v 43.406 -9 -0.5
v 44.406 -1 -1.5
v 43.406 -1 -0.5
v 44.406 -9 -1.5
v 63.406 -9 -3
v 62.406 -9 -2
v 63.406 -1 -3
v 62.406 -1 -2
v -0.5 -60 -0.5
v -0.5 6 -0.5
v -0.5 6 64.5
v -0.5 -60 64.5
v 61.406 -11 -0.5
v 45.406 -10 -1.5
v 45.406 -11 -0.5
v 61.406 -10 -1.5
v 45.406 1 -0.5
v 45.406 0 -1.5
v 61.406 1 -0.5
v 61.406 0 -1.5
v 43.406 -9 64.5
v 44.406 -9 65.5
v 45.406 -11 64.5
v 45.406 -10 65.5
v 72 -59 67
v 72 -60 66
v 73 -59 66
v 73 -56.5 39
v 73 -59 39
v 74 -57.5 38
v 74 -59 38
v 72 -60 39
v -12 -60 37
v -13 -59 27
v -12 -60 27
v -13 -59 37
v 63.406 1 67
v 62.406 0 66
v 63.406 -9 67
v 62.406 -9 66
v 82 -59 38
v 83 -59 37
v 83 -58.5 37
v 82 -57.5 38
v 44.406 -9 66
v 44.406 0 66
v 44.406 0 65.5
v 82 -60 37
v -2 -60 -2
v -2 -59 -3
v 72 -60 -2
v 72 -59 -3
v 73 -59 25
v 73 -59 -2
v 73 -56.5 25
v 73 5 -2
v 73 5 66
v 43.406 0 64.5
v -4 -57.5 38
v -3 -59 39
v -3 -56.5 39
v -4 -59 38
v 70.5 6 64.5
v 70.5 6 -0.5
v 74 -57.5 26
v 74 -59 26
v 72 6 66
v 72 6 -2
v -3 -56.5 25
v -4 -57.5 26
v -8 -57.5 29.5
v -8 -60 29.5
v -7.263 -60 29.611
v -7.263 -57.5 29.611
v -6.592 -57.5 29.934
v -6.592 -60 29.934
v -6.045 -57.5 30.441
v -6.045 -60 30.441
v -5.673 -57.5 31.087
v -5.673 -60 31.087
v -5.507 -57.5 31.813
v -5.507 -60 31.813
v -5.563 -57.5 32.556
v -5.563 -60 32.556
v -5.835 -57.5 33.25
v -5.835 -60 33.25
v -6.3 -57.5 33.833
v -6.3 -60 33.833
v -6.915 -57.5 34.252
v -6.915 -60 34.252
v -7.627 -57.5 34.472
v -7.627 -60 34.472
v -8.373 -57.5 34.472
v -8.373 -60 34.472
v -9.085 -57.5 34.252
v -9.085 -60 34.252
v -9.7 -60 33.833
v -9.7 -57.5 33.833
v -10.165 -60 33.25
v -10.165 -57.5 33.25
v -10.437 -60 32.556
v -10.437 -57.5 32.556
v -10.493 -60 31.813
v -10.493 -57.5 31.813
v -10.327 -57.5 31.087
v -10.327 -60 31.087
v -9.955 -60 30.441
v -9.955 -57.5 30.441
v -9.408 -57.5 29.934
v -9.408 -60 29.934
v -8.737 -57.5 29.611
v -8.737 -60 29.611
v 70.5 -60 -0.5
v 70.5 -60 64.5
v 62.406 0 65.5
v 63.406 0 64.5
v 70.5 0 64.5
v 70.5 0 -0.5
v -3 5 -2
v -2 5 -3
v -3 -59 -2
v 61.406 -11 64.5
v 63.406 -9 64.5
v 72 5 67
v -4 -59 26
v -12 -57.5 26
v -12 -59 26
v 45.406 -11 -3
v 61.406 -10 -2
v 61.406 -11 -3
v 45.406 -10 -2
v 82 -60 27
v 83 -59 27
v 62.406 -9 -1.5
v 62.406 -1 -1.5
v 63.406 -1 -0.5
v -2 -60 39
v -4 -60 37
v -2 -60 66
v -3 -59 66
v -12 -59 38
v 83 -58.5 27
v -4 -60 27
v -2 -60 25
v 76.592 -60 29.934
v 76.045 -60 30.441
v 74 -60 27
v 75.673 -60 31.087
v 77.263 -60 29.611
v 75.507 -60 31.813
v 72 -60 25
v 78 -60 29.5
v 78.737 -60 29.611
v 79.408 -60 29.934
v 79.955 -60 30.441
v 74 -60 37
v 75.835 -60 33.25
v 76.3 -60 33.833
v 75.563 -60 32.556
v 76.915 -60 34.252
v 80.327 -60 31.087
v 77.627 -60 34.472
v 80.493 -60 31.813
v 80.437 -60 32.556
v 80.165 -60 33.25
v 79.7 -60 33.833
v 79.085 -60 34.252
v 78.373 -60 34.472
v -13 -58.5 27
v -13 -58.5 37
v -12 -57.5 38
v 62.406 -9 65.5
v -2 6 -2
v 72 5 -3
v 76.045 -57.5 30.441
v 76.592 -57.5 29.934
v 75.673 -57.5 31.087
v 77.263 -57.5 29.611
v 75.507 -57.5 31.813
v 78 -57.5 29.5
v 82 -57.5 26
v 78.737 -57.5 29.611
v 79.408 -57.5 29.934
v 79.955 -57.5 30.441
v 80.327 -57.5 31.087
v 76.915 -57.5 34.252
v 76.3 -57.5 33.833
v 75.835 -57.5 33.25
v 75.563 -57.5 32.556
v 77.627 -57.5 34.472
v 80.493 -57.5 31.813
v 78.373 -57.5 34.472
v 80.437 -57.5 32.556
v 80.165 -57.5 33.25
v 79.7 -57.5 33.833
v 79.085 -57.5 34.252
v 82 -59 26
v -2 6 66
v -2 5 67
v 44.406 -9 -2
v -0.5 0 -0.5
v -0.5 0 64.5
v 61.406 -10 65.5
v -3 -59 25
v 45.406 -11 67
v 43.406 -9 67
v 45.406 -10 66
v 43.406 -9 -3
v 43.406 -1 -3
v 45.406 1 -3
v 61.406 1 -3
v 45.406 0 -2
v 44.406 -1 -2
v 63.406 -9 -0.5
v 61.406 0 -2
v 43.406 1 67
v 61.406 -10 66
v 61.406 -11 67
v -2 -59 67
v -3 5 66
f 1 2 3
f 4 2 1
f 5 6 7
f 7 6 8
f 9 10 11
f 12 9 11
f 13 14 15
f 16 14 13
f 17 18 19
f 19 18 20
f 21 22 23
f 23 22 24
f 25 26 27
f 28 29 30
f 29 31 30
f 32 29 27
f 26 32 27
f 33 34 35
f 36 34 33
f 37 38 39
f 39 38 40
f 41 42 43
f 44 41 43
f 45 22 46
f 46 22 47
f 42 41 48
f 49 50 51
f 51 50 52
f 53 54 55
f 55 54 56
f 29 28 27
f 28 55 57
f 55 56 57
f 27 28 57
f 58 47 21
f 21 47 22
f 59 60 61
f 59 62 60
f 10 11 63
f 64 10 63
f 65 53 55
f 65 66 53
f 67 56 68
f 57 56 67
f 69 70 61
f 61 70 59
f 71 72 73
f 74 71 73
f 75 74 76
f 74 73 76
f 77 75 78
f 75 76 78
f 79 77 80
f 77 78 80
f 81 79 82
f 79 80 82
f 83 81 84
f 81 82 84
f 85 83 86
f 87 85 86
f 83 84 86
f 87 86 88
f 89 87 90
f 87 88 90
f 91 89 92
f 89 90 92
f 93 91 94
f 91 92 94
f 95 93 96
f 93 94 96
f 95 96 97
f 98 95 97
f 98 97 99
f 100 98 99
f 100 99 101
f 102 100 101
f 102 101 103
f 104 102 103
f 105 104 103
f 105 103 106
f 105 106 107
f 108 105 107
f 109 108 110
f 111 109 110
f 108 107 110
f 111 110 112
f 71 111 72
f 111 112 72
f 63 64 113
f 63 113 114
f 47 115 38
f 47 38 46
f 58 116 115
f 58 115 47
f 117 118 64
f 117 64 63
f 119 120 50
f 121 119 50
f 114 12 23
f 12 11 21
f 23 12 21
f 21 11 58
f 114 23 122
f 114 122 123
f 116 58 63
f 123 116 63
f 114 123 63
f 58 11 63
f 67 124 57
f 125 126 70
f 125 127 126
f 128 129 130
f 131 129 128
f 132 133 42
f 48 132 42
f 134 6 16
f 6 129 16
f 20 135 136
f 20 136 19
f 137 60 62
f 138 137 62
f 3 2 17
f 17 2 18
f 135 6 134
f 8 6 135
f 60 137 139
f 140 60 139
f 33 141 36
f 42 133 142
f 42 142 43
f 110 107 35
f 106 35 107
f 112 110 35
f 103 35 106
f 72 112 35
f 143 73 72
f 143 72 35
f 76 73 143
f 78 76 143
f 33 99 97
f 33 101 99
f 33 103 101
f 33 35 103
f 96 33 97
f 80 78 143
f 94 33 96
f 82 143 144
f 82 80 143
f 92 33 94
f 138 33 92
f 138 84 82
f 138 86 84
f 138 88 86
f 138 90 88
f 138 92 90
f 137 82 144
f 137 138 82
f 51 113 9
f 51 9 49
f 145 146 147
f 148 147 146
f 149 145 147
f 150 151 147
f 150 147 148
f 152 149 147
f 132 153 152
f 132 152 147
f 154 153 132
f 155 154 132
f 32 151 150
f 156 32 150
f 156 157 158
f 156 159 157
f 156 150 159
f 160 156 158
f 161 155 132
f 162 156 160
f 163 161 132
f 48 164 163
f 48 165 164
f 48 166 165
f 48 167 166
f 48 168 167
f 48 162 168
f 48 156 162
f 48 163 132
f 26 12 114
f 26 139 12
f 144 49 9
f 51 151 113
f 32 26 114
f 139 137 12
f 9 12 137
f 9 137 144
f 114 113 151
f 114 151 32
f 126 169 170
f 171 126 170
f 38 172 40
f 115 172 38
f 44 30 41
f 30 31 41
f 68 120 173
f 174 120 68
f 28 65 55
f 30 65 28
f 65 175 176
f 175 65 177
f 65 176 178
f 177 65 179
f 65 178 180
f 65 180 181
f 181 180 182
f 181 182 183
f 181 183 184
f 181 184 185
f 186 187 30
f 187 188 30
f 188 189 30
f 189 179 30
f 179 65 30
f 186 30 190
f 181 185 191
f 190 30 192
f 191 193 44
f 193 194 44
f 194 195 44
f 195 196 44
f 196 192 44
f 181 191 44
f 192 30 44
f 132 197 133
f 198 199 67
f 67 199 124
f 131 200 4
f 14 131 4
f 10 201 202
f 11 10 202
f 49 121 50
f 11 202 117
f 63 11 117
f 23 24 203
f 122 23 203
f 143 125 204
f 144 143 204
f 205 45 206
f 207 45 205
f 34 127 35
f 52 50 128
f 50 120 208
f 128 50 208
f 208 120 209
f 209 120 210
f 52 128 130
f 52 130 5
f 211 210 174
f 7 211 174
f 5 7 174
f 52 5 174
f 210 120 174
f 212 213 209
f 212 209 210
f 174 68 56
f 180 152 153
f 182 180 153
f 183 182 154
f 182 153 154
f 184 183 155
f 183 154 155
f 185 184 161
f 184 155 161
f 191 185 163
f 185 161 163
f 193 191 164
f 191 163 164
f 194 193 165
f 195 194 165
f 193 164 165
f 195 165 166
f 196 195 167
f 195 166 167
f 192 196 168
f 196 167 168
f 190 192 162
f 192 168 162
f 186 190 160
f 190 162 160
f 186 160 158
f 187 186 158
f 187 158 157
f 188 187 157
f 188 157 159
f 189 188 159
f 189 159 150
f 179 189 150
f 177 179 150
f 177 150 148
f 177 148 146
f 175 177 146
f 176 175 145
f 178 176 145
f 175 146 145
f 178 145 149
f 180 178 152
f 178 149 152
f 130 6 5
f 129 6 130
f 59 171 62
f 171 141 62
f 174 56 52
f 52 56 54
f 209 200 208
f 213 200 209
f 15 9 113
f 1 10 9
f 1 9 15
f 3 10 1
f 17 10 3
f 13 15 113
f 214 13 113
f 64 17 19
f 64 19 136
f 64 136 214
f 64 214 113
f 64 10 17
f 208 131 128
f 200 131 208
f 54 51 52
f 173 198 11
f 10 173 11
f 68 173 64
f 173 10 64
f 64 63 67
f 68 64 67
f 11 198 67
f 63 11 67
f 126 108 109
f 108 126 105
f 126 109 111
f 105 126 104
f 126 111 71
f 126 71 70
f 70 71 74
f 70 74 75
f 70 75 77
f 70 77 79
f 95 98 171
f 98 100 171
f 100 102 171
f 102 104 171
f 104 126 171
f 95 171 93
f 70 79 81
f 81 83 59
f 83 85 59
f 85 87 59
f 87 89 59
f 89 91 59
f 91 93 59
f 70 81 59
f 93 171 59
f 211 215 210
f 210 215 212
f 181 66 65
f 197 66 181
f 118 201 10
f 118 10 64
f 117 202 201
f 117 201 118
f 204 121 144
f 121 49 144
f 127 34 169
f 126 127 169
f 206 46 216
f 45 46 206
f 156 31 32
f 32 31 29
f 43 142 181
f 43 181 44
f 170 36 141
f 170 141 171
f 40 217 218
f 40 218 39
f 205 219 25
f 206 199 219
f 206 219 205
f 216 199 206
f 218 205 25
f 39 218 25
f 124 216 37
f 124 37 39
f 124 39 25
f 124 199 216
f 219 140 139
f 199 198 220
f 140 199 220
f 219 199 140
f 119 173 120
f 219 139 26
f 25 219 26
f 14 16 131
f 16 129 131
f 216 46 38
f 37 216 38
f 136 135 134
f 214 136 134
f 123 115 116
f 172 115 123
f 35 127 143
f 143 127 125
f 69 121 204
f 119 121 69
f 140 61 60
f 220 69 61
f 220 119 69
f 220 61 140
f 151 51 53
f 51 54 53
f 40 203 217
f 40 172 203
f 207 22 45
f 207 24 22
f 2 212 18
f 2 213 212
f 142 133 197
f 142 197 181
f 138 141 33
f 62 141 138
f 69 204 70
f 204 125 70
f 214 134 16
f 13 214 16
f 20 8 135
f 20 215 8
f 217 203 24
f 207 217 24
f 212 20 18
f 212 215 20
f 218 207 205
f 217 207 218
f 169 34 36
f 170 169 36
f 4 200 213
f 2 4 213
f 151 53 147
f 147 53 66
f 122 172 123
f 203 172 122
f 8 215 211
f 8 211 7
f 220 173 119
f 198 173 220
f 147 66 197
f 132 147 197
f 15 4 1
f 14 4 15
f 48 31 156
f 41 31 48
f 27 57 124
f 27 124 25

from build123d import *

# Parameters (mm, degrees)
SKETCH_1_W           = 70
SKETCH_1_H           = 64
EXTRUDE_1_DEPTH      = 6
SKETCH_2_W           = 71
SKETCH_2_H           = 65
SKETCH_2_W_2         = 70
SKETCH_2_H_2         = 64
EXTRUDE_2_DEPTH      = 6
EXTRUDE_3_DEPTH      = 60
EXTRUDE_3_DEPTH_BACK = 6
SKETCH_2_4_W         = 76
SKETCH_2_4_H         = 70
SKETCH_2_4_W_2       = 71
SKETCH_2_4_H_2       = 65
SKETCH_6_W           = 18
SKETCH_6_H           = 10
CUT_EXTRUDE_2_DEPTH  = 117
SKETCH_7_W           = 10
SKETCH_7_H           = 12
SKETCH_7_R           = 2.5
EXTRUDE_4_DEPTH      = 2.5
CHAMFER_1_SIZE       = 1


with BuildPart() as part:
    # 草图1 → 凸台-拉伸1 (new body)
    with BuildSketch(Plane(origin=(0, 0, 0), x_dir=(1, 0, 0), z_dir=(0, 1, 0))):
        with Locations((35, -32)):
            Rectangle(SKETCH_1_W, SKETCH_1_H)
    extrude(amount=EXTRUDE_1_DEPTH)

    # 草图2 → 凸台-拉伸2 (add)
    with BuildSketch(Plane.XZ):
        with Locations((35, 32)):
            Rectangle(SKETCH_2_W, SKETCH_2_H)
        with Locations((35, 32)):
            Rectangle(SKETCH_2_W_2, SKETCH_2_H_2, mode=Mode.SUBTRACT)
    extrude(amount=-EXTRUDE_2_DEPTH)


with BuildPart() as body_2:
    # 草图2<4> → 凸台-拉伸3 (new, two sides: drawn at the far end of the back side and taken through both)
    with BuildSketch(Plane.XZ.offset(-EXTRUDE_3_DEPTH_BACK)):
        with Locations((35, 32)):
            Rectangle(SKETCH_2_4_W, SKETCH_2_4_H)
        with Locations((35, 32)):
            Rectangle(SKETCH_2_4_W_2, SKETCH_2_4_H_2, mode=Mode.SUBTRACT)
    extrude(amount=EXTRUDE_3_DEPTH + EXTRUDE_3_DEPTH_BACK)

    # 草图6 → 切除-拉伸2 (cut)
    with BuildSketch(Plane(origin=(0, 0, -3), x_dir=(-1, 0, 0), z_dir=(0, 0, -1))):
        with Locations((-53.406339693, -5)):
            Rectangle(SKETCH_6_W, SKETCH_6_H)
    extrude(amount=-CUT_EXTRUDE_2_DEPTH, mode=Mode.SUBTRACT)

    # 草图7 → 凸台-拉伸4 (add)
    # profile 1 of 2: a face of its own
    with BuildSketch(Plane.XZ.offset(60)):
        with Locations((-8, 32)):
            Rectangle(SKETCH_7_W, SKETCH_7_H)
        with Locations((-8, 32)):
            Circle(SKETCH_7_R, mode=Mode.SUBTRACT)
    # profile 2 of 2: a face of its own
    with BuildSketch(Plane.XZ.offset(60)):
        with Locations((78, 32)):
            Rectangle(SKETCH_7_W, SKETCH_7_H)
        with Locations((78, 32)):
            Circle(SKETCH_7_R, mode=Mode.SUBTRACT)
    extrude(amount=-EXTRUDE_4_DEPTH)

    # 倒角1
    chamfer_1_edges = [body_2.edges().sort_by_distance(p)[0] for p in [
        (-8, -60, 26),
        (-8, -60, 38),
        (78, -60, 38),
        (78, -60, 26),
        (-3, -60, 11.5),
        (-3, 6, 32),
        (-3, -58.75, 26),
        (-3, -57.5, 32),
        (-3, -58.75, 38),
        (-3, -60, 52.5),
        (35, 6, 67),
        (-3, -27, 67),
        (35, -60, 67),
        (73, -60, 52.5),
        (73, -27, 67),
        (73, 6, 32),
        (73, -58.75, 38),
        (73, -57.5, 32),
        (73, -58.75, 26),
        (73, -60, 11.5),
        (35, 6, -3),
        (-3, -27, -3),
        (35, -60, -3),
        (73, -27, -3),
        (-13, -58.75, 26),
        (-13, -57.5, 32),
        (-13, -58.75, 38),
        (-13, -60, 32),
        (83, -58.75, 38),
        (83, -57.5, 32),
        (83, -58.75, 26),
        (83, -60, 32),
        (44.406339693, -5, 64.5),
        (62.406339693, -5, 64.5),
        (53.406339693, 0, 67),
        (44.406339693, -5, 67),
        (62.406339693, -5, 67),
        (53.406339693, -10, 64.5),
        (62.406339693, -10, 65.75),
        (53.406339693, -10, 67),
        (44.406339693, -10, 65.75),
        (53.406339693, -10, -0.5),
        (44.406339693, -10, -1.75),
        (53.406339693, -10, -3),
        (62.406339693, -10, -1.75),
        (44.406339693, -5, -0.5),
        (62.406339693, -5, -0.5),
        (62.406339693, -5, -3),
        (44.406339693, -5, -3),
        (53.406339693, 0, -0.5),
        (62.406339693, 0, -1.75),
        (53.406339693, 0, -3),
        (44.406339693, 0, -1.75),
    ]]
    chamfer(chamfer_1_edges, length=CHAMFER_1_SIZE)


solid = Compound([part.part, body_2.part])
